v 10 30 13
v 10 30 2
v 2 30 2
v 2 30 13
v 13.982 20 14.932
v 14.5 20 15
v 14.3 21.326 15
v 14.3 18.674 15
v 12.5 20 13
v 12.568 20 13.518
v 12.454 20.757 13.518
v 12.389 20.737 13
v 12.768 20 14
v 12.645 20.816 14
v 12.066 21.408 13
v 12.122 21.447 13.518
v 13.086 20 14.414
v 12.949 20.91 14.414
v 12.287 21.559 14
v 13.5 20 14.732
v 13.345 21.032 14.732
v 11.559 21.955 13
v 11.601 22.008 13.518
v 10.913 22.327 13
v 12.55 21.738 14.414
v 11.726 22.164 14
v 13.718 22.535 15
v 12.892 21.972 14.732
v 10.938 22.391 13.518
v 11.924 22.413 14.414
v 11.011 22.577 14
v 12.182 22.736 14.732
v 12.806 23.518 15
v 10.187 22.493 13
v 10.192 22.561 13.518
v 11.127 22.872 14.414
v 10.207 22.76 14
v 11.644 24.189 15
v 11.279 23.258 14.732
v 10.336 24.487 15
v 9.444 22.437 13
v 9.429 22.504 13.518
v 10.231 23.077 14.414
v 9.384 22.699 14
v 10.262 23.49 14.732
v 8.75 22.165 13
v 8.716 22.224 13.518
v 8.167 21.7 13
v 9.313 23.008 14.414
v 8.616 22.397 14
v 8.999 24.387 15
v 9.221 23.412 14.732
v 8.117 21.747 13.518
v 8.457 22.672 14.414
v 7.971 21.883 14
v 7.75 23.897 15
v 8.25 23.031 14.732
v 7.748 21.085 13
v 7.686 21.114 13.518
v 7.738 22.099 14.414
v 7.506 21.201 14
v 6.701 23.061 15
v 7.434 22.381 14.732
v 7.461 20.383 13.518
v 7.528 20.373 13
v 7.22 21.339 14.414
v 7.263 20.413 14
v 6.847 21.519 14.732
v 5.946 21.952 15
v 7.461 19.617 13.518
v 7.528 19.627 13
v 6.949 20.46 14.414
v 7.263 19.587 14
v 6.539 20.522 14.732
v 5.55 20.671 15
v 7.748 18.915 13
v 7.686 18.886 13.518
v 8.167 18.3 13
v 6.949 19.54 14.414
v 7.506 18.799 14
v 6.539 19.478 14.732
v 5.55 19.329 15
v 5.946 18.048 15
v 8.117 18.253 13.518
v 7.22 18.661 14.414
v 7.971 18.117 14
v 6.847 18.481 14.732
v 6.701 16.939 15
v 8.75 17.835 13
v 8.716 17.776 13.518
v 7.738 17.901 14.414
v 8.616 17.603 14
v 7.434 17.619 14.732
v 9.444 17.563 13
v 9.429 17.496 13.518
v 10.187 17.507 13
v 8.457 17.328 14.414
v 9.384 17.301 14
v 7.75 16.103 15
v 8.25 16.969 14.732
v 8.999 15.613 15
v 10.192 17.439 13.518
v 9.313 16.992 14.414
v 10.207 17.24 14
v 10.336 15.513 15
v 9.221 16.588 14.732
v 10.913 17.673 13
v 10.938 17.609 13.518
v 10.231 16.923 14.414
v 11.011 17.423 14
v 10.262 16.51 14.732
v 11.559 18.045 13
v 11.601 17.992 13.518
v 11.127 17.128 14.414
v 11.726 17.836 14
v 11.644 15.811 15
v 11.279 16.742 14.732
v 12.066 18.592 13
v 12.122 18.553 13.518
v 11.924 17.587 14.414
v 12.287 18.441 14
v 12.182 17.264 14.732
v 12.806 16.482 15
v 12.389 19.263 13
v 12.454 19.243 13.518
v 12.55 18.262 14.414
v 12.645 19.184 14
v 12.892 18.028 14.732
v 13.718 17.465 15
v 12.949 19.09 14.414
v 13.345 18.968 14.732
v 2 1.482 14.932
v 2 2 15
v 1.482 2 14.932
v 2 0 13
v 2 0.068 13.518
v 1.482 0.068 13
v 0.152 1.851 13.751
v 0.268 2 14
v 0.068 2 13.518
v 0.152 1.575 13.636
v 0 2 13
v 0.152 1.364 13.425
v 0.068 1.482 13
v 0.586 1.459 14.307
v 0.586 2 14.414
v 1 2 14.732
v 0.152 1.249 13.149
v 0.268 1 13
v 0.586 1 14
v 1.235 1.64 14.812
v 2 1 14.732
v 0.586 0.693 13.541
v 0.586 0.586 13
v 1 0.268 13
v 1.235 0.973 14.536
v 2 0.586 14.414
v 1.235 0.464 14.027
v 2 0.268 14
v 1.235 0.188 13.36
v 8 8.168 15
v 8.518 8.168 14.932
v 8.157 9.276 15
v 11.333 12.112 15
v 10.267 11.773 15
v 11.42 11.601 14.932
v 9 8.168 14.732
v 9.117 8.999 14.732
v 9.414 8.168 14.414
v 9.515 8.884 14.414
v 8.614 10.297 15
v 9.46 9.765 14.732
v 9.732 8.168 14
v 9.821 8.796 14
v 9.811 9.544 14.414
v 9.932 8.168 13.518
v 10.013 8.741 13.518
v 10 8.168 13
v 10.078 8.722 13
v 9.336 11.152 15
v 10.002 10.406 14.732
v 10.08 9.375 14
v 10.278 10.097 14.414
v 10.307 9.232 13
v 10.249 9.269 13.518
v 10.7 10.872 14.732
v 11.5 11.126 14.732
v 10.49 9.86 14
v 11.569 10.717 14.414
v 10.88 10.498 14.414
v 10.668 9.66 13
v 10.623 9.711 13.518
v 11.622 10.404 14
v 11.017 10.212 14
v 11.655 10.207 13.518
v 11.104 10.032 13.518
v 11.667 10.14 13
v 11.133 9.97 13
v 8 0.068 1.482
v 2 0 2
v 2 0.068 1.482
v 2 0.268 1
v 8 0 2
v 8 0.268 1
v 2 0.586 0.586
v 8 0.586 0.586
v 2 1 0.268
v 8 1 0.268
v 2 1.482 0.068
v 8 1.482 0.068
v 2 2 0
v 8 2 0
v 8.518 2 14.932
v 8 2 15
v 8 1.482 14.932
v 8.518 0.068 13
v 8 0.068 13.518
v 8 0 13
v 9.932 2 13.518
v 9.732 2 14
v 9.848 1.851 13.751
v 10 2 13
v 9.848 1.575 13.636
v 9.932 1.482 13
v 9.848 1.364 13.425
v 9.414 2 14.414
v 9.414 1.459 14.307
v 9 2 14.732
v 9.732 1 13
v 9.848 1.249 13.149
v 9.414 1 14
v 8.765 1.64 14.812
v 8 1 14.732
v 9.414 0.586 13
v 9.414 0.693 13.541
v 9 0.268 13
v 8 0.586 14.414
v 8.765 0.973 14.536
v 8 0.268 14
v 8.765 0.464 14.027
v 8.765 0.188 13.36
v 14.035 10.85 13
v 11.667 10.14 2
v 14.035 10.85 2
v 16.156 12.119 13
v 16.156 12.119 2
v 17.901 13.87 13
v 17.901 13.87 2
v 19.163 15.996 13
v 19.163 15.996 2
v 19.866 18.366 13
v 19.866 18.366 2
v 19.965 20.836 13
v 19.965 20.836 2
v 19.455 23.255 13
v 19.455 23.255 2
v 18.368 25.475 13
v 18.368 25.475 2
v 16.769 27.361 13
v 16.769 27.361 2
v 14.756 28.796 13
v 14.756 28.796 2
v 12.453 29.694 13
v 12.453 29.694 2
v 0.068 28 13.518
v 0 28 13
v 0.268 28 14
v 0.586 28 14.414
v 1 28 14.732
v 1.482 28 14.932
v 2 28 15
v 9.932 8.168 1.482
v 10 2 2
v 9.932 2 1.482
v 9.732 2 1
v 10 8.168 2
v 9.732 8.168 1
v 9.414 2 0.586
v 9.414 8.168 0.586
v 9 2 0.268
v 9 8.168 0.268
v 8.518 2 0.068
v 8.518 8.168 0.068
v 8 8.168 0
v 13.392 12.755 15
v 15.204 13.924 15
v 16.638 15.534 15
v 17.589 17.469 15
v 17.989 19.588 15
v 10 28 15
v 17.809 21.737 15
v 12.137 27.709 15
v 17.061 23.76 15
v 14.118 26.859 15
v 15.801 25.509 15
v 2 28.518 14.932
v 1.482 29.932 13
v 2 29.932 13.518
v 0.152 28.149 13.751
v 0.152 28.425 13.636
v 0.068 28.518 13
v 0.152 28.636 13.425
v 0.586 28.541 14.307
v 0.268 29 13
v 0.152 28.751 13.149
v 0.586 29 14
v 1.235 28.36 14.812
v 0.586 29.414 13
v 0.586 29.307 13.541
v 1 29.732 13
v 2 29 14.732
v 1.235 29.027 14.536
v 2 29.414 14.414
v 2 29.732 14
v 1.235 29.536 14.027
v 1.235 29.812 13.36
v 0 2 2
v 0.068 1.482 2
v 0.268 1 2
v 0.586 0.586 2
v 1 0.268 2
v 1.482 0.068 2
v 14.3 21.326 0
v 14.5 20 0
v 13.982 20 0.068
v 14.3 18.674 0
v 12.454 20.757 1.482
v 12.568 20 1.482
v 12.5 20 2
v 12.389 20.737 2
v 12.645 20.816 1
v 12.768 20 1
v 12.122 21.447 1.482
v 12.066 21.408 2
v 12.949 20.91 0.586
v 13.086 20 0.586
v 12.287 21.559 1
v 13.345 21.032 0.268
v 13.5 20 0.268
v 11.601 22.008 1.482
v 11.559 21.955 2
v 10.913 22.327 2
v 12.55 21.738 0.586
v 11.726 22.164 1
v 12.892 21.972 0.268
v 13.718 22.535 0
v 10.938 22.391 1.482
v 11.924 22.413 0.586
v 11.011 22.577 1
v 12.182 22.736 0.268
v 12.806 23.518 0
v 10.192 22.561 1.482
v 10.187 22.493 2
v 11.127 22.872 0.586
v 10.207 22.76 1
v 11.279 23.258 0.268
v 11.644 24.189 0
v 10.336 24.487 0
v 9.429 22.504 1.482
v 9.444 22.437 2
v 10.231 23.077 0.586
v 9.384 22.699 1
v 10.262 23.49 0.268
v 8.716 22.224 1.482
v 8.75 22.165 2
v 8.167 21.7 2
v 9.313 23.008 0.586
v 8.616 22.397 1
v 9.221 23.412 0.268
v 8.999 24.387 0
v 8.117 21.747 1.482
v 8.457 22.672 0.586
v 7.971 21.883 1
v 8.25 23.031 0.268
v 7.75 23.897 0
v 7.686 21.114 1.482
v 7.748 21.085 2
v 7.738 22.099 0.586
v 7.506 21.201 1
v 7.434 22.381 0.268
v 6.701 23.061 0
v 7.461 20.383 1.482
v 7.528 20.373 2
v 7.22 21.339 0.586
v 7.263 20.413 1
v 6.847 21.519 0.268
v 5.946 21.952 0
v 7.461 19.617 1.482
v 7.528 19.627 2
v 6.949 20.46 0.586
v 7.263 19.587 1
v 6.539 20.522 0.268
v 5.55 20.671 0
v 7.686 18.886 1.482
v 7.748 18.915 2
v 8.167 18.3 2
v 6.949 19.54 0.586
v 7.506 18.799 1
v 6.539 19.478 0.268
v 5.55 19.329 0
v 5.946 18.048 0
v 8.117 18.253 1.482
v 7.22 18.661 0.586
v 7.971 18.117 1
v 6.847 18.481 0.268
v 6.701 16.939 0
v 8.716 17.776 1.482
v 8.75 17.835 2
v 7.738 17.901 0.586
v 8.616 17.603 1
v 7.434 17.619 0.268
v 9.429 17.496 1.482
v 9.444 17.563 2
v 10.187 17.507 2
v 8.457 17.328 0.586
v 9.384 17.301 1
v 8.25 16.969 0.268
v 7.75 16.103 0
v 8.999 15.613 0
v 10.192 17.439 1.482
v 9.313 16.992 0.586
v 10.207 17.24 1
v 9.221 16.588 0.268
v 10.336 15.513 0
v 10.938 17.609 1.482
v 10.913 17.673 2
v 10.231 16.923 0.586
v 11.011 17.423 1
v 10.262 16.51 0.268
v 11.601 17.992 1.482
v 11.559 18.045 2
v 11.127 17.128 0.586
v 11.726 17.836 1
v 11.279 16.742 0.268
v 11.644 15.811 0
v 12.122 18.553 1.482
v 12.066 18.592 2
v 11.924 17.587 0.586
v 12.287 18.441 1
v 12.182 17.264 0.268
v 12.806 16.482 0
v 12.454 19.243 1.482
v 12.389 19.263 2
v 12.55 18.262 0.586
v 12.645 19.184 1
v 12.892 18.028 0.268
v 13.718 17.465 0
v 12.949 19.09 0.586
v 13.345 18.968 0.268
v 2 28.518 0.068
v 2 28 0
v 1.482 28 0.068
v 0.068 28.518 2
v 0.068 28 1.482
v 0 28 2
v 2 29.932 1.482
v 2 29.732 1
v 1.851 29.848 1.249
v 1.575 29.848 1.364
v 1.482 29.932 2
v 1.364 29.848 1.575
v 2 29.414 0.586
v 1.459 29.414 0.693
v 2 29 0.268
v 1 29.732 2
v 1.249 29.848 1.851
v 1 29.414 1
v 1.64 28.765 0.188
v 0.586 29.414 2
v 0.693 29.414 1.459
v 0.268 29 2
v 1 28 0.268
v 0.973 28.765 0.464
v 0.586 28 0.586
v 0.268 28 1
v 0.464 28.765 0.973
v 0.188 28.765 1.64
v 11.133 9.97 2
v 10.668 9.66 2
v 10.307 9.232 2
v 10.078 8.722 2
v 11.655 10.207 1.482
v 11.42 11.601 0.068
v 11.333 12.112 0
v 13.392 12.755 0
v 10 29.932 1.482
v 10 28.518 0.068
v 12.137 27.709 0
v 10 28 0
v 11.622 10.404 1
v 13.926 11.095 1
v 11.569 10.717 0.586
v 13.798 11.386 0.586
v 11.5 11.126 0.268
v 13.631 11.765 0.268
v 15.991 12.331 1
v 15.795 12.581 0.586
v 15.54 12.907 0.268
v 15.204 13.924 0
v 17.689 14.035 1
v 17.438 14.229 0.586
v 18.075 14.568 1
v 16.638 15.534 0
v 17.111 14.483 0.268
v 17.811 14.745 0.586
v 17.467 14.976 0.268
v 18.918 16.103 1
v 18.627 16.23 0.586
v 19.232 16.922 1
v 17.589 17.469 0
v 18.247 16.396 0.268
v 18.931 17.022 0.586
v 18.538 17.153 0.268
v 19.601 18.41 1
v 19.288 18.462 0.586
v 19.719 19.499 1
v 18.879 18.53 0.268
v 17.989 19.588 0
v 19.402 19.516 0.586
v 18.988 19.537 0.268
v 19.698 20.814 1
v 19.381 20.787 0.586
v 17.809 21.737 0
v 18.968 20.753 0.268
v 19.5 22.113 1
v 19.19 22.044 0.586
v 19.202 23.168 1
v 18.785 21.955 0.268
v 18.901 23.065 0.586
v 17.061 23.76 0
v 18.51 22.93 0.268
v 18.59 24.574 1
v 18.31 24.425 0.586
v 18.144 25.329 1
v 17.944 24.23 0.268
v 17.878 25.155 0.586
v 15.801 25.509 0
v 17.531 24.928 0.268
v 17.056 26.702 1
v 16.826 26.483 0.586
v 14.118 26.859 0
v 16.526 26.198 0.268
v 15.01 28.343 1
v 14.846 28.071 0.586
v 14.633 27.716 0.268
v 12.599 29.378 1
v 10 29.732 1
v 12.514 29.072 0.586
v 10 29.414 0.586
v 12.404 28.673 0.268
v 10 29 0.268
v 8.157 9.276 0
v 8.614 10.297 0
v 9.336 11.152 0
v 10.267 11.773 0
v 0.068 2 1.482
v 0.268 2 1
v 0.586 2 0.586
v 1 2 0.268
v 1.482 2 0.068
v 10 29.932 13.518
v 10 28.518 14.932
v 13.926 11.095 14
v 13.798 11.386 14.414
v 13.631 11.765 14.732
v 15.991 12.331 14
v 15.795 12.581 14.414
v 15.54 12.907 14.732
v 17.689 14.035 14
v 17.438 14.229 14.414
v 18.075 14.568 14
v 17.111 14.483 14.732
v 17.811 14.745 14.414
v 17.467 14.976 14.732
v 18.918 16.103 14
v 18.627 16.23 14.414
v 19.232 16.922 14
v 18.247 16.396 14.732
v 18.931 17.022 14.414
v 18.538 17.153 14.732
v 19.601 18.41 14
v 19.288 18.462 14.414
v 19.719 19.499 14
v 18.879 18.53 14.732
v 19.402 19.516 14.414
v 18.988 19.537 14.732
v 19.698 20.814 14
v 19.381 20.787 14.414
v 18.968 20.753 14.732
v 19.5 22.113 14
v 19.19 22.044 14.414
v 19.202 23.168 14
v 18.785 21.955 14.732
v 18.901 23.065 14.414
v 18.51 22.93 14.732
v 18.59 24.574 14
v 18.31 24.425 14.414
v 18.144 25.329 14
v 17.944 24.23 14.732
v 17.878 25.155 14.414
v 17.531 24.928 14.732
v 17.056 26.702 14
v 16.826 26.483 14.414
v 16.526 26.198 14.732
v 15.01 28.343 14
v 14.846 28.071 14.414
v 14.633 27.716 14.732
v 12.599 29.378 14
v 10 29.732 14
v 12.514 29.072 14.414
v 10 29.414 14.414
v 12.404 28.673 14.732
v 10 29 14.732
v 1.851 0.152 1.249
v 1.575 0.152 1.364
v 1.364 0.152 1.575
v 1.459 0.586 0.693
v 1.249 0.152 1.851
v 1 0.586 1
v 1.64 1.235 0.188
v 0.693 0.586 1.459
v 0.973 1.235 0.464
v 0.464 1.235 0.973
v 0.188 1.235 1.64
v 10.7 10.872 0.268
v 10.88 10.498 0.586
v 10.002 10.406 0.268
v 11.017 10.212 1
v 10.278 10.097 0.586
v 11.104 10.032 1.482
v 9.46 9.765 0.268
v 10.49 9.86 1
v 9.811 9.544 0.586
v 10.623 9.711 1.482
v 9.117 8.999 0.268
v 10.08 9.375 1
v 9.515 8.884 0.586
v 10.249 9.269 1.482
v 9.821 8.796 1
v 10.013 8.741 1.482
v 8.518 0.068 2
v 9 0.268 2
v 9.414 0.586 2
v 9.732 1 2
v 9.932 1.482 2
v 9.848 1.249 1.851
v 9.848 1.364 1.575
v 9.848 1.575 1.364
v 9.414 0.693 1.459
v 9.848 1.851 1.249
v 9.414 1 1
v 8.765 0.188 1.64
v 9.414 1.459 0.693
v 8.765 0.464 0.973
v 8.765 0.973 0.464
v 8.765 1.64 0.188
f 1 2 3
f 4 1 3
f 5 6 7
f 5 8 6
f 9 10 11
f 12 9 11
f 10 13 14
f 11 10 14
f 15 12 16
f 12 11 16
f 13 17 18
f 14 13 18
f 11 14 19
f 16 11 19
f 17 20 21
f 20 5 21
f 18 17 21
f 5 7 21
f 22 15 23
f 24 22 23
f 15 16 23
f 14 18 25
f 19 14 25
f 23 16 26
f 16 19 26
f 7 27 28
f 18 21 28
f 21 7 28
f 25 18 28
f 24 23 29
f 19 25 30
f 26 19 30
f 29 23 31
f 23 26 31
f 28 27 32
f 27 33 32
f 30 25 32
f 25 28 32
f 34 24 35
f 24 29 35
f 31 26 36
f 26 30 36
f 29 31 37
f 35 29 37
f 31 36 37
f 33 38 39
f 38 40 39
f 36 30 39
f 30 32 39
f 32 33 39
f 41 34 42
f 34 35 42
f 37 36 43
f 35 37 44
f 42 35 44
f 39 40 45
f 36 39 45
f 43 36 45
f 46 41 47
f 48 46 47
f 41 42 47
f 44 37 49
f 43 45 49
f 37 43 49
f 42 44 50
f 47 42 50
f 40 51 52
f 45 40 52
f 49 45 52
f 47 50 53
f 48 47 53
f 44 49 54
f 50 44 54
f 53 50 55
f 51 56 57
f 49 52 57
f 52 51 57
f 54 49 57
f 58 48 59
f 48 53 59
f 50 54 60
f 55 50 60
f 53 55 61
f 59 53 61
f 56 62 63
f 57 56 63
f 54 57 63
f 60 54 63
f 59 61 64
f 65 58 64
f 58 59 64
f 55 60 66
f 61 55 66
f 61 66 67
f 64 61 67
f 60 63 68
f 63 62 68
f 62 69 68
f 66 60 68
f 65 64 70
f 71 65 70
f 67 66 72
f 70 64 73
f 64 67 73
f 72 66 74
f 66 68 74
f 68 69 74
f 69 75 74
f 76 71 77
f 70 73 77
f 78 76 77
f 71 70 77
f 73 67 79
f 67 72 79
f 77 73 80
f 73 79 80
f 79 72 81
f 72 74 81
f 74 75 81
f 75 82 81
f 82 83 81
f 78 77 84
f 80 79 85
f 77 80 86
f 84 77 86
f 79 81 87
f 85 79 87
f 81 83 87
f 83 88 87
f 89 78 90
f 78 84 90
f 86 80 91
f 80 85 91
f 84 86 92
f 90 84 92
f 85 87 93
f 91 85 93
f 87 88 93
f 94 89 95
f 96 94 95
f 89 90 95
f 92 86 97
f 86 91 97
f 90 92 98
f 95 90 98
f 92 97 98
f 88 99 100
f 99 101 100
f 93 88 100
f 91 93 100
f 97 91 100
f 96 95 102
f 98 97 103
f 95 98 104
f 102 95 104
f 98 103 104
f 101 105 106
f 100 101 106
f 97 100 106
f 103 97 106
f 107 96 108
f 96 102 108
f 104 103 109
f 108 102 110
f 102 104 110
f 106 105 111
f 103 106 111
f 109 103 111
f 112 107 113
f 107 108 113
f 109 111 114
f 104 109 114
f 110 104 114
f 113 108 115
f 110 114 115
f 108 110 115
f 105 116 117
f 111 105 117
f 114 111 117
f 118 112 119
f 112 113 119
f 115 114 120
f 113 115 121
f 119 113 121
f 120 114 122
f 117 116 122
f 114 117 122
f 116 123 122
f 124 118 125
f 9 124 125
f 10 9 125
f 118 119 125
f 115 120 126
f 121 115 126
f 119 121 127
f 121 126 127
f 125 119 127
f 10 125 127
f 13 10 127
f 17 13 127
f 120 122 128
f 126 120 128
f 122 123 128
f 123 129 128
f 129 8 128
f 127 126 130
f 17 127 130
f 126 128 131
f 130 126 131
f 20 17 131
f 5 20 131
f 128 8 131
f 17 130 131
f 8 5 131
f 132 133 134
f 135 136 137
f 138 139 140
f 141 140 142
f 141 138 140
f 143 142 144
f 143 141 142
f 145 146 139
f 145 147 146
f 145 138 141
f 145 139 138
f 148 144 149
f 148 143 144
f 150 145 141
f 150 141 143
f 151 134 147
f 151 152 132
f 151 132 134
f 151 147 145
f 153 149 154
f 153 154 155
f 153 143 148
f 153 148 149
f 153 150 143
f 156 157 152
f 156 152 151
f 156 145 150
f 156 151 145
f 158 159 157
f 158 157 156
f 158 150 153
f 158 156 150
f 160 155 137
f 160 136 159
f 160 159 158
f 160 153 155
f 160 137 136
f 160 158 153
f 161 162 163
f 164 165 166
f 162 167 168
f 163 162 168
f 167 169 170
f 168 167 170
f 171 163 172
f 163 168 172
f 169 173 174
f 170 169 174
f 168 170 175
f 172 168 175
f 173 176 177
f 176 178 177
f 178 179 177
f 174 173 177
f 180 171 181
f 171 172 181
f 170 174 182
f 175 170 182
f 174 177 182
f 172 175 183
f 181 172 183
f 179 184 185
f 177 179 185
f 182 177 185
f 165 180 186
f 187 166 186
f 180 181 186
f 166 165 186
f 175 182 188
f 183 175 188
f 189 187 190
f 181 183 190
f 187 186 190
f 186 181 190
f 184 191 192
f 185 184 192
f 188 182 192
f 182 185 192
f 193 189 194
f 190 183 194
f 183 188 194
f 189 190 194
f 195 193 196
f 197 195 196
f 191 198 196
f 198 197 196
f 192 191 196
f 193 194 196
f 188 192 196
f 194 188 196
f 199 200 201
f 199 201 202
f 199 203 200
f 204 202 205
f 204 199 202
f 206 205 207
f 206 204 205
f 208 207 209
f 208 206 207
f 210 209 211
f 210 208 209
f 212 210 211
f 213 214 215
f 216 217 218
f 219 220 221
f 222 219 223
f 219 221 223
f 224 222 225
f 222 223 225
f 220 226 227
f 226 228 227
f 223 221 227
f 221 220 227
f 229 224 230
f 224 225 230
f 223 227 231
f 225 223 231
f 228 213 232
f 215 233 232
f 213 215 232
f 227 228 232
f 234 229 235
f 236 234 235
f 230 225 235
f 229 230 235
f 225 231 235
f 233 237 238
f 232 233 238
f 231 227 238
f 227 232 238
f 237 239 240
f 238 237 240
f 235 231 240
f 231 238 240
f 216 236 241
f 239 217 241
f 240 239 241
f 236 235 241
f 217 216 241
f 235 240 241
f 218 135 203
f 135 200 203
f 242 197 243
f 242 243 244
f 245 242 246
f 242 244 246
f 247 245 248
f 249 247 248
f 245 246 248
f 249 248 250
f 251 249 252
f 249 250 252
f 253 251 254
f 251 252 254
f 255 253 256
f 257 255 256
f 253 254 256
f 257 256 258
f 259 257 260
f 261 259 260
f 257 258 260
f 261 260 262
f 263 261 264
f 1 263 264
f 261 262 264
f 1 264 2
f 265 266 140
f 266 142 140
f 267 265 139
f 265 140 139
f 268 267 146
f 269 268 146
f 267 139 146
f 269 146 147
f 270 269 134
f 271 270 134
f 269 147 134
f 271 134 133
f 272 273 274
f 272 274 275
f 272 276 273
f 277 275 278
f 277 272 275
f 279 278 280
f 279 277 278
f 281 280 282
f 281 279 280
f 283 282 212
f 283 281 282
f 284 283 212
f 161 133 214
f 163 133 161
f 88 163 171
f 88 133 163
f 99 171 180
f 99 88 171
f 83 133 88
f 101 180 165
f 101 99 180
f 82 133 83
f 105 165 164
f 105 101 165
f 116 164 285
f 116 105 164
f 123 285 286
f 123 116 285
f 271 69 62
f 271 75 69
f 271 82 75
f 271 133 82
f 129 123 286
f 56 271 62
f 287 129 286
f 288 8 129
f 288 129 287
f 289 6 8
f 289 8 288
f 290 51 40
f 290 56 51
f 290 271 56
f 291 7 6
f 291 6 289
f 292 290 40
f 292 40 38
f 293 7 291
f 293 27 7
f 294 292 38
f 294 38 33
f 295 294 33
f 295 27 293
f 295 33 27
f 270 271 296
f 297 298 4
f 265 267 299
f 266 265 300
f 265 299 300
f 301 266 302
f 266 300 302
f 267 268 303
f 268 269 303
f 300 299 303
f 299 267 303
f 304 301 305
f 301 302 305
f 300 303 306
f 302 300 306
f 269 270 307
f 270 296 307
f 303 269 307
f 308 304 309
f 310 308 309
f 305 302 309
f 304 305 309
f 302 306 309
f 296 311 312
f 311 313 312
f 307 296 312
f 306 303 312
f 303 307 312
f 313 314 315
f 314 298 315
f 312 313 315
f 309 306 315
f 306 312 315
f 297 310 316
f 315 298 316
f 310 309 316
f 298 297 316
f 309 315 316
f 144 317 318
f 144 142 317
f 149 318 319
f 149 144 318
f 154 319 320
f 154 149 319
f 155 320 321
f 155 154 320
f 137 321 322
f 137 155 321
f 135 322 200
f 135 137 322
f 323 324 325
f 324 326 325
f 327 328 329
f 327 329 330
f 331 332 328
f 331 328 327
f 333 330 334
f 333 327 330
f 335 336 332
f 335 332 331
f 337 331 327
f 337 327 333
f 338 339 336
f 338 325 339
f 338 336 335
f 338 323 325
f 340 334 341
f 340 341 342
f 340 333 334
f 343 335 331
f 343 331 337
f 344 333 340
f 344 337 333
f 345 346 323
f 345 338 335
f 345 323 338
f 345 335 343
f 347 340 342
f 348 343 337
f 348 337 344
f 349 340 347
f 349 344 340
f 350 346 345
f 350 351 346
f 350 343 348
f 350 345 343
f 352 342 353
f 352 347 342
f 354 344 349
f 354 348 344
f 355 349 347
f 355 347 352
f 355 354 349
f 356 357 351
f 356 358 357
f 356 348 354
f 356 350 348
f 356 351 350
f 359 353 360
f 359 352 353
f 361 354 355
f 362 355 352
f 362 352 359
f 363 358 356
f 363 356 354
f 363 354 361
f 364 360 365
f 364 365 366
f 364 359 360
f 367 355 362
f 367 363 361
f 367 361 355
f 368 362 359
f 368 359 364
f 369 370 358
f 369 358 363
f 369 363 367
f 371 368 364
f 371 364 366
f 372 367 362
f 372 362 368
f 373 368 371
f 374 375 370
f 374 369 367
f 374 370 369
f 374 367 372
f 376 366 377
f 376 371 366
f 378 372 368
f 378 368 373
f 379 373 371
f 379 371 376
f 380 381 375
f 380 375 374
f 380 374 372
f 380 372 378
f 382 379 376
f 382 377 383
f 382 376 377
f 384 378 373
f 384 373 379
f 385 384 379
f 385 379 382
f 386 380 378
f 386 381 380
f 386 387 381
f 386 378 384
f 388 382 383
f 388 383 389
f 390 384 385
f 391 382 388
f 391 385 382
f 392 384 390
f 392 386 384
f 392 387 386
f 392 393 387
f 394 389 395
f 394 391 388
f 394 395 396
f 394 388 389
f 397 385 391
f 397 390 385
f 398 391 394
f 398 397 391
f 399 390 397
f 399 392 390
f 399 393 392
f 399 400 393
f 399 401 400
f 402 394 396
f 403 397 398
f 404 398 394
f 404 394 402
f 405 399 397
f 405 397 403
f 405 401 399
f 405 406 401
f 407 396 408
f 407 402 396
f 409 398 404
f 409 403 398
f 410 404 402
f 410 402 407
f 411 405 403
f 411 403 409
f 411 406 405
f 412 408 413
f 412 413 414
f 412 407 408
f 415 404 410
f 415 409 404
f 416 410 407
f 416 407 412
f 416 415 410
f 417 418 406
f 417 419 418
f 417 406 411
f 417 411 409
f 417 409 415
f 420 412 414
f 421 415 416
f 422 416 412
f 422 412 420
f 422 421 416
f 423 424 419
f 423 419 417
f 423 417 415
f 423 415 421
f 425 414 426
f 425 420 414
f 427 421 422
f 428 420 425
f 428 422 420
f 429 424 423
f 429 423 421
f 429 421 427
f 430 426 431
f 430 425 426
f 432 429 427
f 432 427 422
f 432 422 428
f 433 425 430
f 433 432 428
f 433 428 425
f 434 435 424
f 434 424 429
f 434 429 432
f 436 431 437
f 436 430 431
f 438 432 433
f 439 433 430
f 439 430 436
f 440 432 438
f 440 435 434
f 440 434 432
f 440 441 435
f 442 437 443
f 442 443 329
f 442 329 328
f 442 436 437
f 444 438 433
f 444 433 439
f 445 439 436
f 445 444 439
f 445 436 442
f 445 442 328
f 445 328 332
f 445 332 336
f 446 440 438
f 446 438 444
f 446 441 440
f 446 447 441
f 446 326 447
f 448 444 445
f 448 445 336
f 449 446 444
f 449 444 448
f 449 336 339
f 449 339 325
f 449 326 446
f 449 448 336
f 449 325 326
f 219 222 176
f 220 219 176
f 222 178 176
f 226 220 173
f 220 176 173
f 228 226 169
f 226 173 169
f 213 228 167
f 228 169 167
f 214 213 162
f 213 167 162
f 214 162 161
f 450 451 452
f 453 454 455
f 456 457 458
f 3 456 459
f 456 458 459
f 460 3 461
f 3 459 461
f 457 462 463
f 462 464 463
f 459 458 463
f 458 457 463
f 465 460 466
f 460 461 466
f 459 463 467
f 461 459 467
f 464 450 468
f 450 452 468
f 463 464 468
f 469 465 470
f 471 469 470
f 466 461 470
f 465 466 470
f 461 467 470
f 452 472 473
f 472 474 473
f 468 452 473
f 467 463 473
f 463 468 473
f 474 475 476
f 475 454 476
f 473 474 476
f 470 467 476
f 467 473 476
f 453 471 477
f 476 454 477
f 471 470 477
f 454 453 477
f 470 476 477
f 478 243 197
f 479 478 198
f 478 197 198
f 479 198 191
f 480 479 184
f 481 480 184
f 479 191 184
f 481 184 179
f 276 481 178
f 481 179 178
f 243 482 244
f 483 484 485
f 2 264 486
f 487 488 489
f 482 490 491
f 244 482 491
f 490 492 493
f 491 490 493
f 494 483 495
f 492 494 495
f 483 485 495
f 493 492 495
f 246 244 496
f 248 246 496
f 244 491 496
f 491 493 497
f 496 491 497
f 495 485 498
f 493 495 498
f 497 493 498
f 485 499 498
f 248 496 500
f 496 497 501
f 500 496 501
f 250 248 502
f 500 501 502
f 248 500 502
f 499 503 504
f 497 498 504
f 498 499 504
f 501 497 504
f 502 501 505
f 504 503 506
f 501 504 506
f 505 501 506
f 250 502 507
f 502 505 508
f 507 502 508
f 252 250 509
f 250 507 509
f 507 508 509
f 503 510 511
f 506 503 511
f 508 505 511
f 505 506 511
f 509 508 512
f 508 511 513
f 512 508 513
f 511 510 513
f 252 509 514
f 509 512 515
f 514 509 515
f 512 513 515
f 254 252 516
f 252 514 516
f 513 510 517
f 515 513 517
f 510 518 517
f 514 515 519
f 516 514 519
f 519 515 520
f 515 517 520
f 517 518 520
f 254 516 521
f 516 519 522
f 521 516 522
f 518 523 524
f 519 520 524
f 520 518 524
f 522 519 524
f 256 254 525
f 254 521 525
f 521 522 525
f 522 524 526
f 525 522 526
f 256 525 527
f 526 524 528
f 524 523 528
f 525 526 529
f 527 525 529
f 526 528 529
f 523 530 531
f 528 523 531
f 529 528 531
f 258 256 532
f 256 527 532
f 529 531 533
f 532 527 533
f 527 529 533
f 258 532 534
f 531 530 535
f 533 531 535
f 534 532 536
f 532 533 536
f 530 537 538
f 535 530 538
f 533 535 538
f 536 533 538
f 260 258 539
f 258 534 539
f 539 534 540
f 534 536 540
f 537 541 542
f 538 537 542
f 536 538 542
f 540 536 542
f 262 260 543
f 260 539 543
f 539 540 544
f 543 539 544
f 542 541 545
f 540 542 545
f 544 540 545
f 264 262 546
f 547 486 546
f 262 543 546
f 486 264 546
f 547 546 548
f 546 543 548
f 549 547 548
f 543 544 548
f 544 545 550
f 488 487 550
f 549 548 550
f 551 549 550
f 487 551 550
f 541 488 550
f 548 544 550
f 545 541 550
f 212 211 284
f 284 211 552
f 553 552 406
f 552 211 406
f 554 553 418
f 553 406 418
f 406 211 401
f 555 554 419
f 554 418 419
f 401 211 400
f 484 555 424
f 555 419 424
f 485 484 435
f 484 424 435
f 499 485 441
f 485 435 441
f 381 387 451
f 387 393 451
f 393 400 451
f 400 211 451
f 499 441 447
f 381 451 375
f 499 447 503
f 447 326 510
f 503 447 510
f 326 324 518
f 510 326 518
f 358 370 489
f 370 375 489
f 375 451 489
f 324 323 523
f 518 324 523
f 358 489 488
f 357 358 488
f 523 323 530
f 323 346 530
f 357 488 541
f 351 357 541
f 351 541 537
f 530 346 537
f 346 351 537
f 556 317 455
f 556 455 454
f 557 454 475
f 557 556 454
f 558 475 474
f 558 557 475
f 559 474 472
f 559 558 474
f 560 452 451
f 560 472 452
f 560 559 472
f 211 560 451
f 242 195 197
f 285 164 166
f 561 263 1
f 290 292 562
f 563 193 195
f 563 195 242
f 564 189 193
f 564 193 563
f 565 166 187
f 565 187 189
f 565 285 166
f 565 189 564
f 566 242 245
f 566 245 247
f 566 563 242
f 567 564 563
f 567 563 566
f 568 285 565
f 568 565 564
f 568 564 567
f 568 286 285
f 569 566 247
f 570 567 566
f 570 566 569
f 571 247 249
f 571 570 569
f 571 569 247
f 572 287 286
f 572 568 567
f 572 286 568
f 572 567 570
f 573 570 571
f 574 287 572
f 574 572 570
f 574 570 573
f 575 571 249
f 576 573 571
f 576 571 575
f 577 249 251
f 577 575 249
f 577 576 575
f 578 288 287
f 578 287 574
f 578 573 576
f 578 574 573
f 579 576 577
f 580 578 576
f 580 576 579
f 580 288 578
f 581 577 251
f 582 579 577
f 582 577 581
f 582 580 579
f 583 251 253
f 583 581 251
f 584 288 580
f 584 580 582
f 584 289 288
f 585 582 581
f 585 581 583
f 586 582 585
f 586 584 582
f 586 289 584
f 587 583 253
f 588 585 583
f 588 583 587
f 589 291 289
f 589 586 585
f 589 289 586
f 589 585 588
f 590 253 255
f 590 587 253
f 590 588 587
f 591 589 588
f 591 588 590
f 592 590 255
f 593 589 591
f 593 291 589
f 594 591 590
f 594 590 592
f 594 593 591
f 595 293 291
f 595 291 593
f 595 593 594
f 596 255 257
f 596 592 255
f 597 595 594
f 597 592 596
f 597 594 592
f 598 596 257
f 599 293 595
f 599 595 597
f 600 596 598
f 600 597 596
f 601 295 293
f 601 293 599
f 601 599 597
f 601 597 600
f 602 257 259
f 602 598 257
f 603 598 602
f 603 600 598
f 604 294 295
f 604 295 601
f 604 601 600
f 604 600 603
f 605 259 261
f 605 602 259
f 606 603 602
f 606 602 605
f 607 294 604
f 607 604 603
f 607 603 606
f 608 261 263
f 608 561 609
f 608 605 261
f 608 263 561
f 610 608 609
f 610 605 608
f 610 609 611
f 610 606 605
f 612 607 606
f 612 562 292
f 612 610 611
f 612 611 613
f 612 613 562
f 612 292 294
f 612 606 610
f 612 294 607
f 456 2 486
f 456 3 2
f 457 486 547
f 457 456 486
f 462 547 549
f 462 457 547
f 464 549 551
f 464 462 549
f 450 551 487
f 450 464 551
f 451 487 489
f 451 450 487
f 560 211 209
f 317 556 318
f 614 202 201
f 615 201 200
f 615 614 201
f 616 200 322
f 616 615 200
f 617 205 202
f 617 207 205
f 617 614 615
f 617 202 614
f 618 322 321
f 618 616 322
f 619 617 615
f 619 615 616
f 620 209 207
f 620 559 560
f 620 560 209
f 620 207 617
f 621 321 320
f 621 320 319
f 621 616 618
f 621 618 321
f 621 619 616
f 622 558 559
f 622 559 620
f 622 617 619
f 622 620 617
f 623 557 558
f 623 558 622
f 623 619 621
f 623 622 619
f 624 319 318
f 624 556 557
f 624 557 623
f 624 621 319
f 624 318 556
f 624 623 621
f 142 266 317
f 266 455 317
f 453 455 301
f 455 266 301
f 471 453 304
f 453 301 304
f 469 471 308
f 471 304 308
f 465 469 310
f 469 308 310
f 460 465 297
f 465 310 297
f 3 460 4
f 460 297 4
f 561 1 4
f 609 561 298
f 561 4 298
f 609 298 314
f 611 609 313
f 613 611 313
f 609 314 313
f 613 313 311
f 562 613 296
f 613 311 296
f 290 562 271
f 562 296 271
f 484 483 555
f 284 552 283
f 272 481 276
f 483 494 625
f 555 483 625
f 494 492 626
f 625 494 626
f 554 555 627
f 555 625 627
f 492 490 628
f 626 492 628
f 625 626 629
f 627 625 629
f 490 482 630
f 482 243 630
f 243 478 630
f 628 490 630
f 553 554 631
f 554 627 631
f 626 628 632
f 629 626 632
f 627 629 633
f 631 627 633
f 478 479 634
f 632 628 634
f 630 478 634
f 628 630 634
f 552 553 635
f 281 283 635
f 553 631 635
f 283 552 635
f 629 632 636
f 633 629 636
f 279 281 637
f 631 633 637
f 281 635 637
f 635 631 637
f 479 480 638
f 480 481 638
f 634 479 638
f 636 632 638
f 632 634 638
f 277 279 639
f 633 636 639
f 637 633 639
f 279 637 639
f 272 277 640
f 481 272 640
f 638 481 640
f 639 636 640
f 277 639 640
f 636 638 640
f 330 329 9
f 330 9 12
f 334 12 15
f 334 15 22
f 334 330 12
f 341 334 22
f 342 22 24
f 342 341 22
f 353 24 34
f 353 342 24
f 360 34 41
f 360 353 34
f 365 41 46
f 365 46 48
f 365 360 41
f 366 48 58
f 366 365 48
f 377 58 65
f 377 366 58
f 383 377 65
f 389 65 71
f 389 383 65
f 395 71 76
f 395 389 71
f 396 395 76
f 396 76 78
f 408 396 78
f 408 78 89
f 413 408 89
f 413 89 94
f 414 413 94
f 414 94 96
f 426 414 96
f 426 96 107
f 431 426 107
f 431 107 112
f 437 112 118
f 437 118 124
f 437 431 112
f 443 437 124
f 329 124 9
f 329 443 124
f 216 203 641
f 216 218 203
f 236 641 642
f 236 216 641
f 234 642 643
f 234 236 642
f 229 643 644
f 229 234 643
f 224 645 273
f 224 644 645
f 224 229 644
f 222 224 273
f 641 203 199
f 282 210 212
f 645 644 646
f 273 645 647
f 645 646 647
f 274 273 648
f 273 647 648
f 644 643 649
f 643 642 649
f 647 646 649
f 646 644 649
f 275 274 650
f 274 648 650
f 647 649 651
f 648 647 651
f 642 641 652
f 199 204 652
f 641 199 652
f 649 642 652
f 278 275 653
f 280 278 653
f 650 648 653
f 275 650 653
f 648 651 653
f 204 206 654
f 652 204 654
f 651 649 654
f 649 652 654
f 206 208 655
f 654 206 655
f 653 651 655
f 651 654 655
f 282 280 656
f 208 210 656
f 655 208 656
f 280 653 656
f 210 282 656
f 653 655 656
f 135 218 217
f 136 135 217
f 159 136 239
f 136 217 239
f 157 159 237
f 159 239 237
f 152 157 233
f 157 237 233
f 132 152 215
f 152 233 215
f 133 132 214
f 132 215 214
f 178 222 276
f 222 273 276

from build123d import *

# Parameters (mm, degrees)
F0_R     = 2.5
F1_DEPTH = 15
F2_R     = 2


with BuildPart() as f1:
    # F0 (on Top) → F1 (new body)
    with BuildSketch(Plane.XY):
        with BuildLine():
            Line((0, 30), (0, 0))
            Line((0, 0), (10, 0))
            Line((10, 0), (10, 10))
            ThreePointArc((10, 10), (20, 20), (10, 30))
            Line((10, 30), (0, 30))
        make_face()
        with Locations((10, 20)):
            Circle(F0_R, mode=Mode.SUBTRACT)
    extrude(amount=F1_DEPTH)

    # F2
    f2_edges = [f1.edges().sort_by_distance(p)[0] for p in [
        (5, 0, 15),
        (10, 5, 15),
        (20, 20, 15),
        (0, 15, 15),
        (0, 15, 0),
        (10, 10, 7.5),
        (10, 30, 7.5),
        (20, 20, 0),
        (7.5, 20, 0),
        (5, 0, 0),
        (0, 0, 7.5),
        (10, 0, 7.5),
        (0, 30, 7.5),
        (12.5, 20, 7.5),
        (7.5, 20, 15),
        (5, 30, 15),
        (5, 30, 0),
        (10, 5, 0),
    ]]
    fillet(f2_edges, radius=F2_R)


solid = f1.part
